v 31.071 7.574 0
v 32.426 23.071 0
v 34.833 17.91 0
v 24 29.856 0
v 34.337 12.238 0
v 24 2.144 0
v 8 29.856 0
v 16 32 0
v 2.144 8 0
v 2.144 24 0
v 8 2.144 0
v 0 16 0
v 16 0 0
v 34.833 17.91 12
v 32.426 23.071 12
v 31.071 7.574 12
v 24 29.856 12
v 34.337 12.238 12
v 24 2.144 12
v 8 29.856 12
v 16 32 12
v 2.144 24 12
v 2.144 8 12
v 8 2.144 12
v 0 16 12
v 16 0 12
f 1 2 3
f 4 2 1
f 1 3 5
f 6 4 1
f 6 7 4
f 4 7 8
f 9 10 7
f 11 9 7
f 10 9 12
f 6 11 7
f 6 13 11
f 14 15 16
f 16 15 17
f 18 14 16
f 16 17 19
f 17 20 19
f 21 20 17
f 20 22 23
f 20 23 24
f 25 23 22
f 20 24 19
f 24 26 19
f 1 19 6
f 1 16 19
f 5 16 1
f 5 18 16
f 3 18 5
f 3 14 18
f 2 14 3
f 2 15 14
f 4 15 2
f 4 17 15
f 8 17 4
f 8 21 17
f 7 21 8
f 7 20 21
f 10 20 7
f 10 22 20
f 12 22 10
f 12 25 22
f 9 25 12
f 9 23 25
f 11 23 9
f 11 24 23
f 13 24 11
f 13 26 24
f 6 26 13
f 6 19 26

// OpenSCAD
$fn = 32;

// ----------------------------------------------------------------------
// Eccentric disc: egg, 12 mm thick
// ----------------------------------------------------------------------

// --- parameters (mm) ---
profile_height = 12;      // extrusion height
profile_points = 13;      // points of the closed outline

profile = [[0, 16], [2.144, 8], [8, 2.144], [16, 0], [24, 2.144], [31.071, 7.574], [34.337, 12.238], [34.833, 17.91], [32.426, 23.071], [24, 29.856], [16, 32], [8, 29.856], [2.144, 24]];  // single closed polygon, 13 points, counter clockwise

// --- the one profile operation ---
linear_extrude(height = profile_height) polygon(points = profile);
